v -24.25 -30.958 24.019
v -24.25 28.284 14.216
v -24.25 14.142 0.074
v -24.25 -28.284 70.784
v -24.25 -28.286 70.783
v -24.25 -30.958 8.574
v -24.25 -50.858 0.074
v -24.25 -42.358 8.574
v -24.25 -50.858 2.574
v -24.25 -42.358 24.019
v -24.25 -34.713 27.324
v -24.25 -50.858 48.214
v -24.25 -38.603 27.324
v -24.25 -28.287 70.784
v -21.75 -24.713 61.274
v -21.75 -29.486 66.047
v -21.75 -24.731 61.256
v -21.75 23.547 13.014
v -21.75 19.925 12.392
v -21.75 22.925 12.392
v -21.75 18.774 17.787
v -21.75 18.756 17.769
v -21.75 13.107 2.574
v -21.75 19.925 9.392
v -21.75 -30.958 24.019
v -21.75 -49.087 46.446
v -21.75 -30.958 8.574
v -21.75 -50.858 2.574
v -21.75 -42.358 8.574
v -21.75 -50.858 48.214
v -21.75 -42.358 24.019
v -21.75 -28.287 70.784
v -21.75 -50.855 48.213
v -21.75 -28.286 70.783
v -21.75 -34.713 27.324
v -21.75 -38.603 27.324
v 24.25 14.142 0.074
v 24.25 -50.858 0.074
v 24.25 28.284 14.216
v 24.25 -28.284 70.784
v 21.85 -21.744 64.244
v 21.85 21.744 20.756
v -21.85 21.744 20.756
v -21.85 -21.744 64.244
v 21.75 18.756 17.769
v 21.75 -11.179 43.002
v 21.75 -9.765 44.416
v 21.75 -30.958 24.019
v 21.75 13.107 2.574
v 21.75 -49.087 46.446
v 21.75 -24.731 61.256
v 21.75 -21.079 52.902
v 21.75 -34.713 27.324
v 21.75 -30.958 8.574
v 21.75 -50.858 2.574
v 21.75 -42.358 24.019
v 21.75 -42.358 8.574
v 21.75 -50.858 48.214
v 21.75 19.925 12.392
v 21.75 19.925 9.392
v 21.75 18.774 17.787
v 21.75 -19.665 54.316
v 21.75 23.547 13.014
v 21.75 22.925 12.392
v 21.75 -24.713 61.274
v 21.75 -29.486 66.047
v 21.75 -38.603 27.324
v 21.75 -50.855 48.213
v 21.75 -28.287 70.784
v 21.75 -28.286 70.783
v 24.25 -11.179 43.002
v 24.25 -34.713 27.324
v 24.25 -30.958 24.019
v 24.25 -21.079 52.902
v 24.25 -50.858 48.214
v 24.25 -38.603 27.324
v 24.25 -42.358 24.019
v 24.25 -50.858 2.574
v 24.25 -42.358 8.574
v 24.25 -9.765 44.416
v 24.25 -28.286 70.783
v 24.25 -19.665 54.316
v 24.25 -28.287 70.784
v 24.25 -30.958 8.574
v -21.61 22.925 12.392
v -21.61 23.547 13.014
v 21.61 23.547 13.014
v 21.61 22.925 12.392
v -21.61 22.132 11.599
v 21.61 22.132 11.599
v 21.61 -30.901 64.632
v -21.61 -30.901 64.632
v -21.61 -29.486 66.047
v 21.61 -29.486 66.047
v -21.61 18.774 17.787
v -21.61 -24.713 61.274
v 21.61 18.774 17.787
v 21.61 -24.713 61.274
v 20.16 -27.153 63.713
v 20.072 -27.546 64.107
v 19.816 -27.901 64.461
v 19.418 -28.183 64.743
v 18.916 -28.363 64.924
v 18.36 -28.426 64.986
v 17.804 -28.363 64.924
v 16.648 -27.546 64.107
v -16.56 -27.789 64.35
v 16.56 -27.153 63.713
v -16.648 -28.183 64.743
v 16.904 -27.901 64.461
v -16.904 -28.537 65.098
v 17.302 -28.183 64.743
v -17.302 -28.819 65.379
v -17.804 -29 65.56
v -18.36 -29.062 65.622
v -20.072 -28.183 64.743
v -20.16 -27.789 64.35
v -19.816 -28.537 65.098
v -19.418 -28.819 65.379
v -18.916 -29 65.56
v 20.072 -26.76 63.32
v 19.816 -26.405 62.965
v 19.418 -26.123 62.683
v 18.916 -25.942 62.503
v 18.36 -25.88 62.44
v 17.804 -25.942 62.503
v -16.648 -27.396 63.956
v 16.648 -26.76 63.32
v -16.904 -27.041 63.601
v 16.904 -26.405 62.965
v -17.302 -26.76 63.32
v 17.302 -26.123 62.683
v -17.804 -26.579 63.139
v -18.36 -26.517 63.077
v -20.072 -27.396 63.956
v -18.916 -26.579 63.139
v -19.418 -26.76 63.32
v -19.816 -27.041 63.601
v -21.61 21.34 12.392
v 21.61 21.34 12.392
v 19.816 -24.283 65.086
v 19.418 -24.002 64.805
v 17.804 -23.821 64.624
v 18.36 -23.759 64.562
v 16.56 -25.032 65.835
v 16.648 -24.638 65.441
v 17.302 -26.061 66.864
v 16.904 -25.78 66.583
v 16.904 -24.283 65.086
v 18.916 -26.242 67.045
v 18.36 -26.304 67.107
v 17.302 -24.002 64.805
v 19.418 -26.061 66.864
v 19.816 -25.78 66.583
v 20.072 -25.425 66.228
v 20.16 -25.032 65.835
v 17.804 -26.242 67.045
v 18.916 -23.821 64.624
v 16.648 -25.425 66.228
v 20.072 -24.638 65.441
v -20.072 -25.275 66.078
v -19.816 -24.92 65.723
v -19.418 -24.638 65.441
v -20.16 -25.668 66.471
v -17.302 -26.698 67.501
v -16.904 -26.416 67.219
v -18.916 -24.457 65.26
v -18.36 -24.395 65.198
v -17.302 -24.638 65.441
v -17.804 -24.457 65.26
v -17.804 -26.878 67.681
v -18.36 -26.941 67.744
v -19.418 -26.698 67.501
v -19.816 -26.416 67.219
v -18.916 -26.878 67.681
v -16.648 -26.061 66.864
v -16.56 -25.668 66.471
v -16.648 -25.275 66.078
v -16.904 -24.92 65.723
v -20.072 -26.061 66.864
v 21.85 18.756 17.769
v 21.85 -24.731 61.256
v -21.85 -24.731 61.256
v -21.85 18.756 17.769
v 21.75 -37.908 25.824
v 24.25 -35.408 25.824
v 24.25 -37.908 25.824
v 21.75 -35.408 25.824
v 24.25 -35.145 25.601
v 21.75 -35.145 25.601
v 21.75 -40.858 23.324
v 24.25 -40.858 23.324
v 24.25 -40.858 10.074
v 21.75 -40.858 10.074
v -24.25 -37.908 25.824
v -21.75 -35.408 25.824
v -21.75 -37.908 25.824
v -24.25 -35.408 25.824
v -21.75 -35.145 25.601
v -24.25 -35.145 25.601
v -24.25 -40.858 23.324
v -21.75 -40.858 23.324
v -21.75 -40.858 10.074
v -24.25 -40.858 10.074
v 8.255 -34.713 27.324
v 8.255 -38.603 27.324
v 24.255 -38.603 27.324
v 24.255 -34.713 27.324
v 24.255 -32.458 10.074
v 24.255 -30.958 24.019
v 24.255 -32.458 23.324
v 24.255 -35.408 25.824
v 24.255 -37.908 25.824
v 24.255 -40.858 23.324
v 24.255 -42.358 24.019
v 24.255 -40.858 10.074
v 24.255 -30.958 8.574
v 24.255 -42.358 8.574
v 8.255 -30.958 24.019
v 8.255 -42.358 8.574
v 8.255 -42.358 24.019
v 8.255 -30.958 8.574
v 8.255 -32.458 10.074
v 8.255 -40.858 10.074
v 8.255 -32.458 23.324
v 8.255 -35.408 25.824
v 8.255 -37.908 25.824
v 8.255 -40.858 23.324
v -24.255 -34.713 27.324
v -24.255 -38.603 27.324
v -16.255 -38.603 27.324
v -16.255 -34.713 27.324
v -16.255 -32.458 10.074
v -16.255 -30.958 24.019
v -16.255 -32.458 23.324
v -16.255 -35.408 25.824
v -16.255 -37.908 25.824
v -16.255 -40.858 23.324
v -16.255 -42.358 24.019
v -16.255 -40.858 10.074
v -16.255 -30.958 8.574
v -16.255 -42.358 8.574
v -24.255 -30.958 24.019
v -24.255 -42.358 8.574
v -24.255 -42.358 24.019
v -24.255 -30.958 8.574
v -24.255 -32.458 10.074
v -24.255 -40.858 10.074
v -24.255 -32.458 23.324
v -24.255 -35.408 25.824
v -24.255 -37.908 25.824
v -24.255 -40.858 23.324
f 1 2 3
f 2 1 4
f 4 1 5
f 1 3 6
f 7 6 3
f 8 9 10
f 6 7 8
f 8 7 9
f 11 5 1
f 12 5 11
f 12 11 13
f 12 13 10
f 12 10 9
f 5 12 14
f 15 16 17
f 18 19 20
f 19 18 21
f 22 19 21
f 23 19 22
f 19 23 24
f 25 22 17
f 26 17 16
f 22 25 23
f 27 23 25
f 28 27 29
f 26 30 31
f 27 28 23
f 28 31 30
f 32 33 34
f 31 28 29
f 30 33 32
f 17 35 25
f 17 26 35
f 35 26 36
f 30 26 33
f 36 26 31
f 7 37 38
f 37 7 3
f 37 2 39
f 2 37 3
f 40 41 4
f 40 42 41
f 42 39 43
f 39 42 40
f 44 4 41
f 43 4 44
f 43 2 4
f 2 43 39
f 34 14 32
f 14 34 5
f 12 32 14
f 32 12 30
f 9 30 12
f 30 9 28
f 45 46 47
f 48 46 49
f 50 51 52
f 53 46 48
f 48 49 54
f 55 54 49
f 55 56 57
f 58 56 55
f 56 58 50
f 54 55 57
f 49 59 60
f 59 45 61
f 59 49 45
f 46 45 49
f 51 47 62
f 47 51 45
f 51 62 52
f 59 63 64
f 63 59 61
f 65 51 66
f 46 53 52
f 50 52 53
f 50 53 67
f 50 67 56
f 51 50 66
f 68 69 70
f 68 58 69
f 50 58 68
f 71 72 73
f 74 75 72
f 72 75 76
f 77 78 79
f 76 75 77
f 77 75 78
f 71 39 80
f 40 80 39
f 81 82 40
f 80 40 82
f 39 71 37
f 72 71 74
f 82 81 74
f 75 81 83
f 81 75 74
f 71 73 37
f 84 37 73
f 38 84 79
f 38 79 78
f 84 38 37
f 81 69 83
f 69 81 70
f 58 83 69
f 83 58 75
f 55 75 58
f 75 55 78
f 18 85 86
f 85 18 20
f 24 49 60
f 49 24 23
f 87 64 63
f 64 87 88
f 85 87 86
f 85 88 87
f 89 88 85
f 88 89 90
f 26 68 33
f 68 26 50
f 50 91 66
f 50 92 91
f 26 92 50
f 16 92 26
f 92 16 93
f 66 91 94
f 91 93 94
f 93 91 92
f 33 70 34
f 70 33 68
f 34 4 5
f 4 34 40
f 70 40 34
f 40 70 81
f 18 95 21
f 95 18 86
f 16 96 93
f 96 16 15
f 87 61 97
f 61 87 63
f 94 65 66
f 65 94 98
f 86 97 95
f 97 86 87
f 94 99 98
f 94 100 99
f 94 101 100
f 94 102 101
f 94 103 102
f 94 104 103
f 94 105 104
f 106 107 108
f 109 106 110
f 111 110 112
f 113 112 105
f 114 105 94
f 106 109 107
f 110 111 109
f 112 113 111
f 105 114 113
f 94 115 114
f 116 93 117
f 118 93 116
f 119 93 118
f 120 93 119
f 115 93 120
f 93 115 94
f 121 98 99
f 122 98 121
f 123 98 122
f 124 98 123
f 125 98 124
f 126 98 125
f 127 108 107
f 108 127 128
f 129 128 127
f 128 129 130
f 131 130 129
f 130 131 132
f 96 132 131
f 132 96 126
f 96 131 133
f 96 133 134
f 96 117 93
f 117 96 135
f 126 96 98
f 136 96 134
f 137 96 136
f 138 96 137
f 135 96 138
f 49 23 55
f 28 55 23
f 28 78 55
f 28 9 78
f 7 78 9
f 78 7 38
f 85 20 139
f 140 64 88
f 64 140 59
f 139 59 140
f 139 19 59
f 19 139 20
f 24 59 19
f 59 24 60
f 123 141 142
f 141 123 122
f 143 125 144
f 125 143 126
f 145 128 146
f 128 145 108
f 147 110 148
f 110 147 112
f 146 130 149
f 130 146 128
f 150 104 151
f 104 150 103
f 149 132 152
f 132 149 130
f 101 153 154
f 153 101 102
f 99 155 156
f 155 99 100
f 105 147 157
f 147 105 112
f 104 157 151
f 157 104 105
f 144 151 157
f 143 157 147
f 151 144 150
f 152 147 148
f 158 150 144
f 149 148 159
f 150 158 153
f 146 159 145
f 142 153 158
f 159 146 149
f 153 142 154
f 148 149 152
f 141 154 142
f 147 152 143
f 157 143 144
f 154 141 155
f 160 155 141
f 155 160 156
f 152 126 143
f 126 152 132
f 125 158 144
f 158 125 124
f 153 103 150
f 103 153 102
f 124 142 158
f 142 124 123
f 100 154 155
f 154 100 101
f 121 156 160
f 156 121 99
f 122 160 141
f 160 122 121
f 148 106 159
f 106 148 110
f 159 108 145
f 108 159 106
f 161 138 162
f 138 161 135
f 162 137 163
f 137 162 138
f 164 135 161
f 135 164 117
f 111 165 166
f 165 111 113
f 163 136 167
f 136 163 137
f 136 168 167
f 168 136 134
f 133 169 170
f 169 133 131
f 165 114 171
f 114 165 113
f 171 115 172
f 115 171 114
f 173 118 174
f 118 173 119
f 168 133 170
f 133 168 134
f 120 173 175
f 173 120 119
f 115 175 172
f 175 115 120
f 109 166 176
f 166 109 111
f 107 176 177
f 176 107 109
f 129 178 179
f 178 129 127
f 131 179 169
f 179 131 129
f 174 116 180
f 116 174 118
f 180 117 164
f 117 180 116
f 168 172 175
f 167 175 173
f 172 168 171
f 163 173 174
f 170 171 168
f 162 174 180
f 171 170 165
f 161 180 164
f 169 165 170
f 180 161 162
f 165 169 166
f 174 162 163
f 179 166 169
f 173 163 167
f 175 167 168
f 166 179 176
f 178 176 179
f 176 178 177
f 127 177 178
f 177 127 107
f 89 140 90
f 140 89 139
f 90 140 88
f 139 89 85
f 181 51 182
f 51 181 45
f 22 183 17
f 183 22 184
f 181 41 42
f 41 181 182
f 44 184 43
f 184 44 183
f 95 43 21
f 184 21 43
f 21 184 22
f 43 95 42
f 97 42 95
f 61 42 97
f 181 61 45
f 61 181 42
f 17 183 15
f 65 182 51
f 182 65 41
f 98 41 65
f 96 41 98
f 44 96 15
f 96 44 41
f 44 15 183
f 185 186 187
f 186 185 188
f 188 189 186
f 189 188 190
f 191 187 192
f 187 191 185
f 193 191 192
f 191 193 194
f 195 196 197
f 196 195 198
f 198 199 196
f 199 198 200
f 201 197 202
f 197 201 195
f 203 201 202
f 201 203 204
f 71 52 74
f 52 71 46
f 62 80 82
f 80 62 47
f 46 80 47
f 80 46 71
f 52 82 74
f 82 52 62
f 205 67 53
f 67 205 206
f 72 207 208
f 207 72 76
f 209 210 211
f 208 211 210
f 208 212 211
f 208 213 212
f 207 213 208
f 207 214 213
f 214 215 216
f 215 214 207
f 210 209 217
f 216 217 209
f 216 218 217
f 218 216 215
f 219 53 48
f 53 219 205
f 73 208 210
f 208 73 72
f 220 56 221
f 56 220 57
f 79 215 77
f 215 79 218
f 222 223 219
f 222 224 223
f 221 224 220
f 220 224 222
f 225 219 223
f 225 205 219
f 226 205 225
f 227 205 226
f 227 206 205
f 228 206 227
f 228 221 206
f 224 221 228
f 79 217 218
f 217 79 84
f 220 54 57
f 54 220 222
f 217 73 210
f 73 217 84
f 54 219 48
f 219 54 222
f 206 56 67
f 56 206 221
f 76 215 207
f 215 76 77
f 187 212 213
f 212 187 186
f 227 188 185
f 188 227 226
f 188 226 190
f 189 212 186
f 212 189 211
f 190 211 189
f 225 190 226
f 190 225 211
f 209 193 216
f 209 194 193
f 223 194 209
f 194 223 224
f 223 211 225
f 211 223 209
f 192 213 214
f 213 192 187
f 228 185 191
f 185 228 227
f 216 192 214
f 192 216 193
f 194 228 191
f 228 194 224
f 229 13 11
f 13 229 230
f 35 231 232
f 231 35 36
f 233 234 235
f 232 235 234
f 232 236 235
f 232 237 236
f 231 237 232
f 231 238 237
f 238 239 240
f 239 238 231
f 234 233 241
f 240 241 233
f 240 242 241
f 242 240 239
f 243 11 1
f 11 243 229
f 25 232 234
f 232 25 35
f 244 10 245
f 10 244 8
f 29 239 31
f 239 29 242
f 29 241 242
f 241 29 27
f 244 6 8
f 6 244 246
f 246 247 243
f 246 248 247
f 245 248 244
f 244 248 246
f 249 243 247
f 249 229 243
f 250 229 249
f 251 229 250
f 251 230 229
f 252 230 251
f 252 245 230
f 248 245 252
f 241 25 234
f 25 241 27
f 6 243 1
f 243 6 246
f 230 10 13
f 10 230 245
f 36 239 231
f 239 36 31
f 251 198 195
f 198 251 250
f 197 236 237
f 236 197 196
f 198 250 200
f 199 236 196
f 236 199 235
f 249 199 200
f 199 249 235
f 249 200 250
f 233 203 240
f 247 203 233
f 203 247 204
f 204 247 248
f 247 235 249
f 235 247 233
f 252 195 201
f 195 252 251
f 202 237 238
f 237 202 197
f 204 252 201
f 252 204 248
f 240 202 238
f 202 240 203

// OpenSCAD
// Screen Model
model = "basic"; //[basic:Basic, enhanced:Enhanced]

// SD Card cut-out
sdcard = "y"; //[y:Yes, n:No]

// XT Connectors
connector = "both"; //[none: None, left:Left Only, right:Right Only, both: Both Sides]

// Direction
direction = "stand"; //[print: Printable, stand: Standing]

module inner_plug(h=0.51) {
    linear_extrude(height=h,center=true)
    polygon(
    [
        [0,0],
        [8.4,0],
        [8.4,13.25],
        [8.4-(8.4-2.5)/2,13.25+2.5],
        [(8.4-2.5)/2,13.25+2.5],
        [0,13.25],
    ])
    ;
}

module outer_plug(h=0.5) {
linear_extrude(height=h,center=true)
    translate([4.2,0])
    polygon(
    [
        [-5.7,	-1.5],
        [-5.7,	13.945],
        [-1.945,	17.25],
        [1.945,	17.25],
        [5.7,	13.945],
        [5.7,	-1.5],
    ]
   );
}

module plug(h=0.5) {
    translate([65.9619407771256,-5.96194077712558,0])
    rotate([0,0,-45+180])
    translate([10,10])
    difference(){    
        outer_plug(h);
        inner_plug(h+0.1);
    }
}

module plug_cut(h=0.5) {
    translate([65.9619407771256,-5.96194077712558,0])
    rotate([0,0,-45+180])
    translate([10,10])
    inner_plug(h+0.1);
}

module sidepanel() {   
    //rotate([0,90,0])
    linear_extrude(height=2.5,center=true)
    polygon(
    [
        [0,0],
        [0,40],
        [20,40],
        [65.9619407771256,-5.96194077712558],
        [31.9218203308052,-40.002061223446],
        [0.00182033080519517,-40.002061223446],
        [0.00182033080518537,-0.00206122344599891],
    ]);
}

module sd_cut() {
    translate([5.8+0.75,-74.4/2+13.94+8,24])
    cube([2,14,5],center=true);
}
    
module bolt_cut() {
    
    $fn=20;
    translate([5.8-1.6-3/2,-74.4/2+2.1+1.8/2,36.72/2])
    rotate([0,90,0])
    cylinder(r=1.8,h=3,center=true);
    
    translate([5.8-1.6-3/2,-74.4/2+2.1,-36.72/2])
    rotate([0,90,0])
    cylinder(r=1.8,h=3,center=true);
}


module hasp() {
    difference() {
    union() {
        color("lightgray")
    translate([0,0,-23]) sidepanel();
        color("darkgray")
    translate([0,0,23-0*2.50]) sidepanel();

    //bottom slope
    translate([10,40-1.25,0]) cube([20,2.5,23*2+2.5],center=true);
    //top slope
    translate([31.92/2,-40+1.25,0]) cube([31.92,2.5,23*2+2.5],center=true);

    // front
    translate([4.2/2,0,0]) cube([4.2,80,23*2+2.5],center=true);
 
    // floor
    
    
    translate([20,40,-23-2.5/2]) rotate([0,0,45+180]) cube([2.5,65,23*2+2.5],center=false);
        
        
        
    //bottom lip large
    /*translate([7.2,40-2.5,24-17/2])
    rotate([0,0,45])
    cube([3,3,17+2.5],center=true);*/

    //bottom lip small
    translate([7.2,40-2.5,0])
    rotate([0,0,45])
    cube([3,3,22.5*2+2.5],center=true);
    }

    //pcb cutout
    translate([4.2+1,0,0]) cube([2,75,42.72+0.5],center=true);

    //translate([9.2,-35,0]) cube([10,10,20],center=true);

    //screen cutout
    translate([4.2/2,0,0]) color("black") cube([4.25,61.5,43.7],center=true);


    if (connector == "both" || connector == "left") 
    color("cyan") translate([0,0,23+1.25-16/2+0.005]) plug_cut(20);

    if (connector == "both" || connector == "right") 
    color("orange")translate([0,0,-23-1.25+8/2-0.005]) plug_cut(20);
    
    
    if (sdcard == "y") sd_cut();

    bolt_cut();
    }

    if (connector == "both" || connector == "left") 
    color("cyan") translate([0,0,23+1.25-16/2+0.005]) plug(16);

    if (connector == "both" || connector == "right") 
    color("orange")translate([0,0,-23-1.25+8/2-0.005]) plug(8);


/*
    // plug supports
    hull() {
    translate([35.2,-13.75,9.25],center=true)
    cube([1,4.5,1.5]);

    translate([35.2,-13.75,23],center=true)
    cube([1,4.5,1.5]);

    translate([35-10
    ,-13.5+10,23],center=true)
    cube([0.1,0.1,0.1]);
    };

    hull() {
    translate([35.2,-13.75,-18.75],center=true)
    cube([1,4.5,1.5]);

    translate([35.2,-13.75,-23],center=true)
    cube([1,4.5,1.5]);

    translate([35-8,-13.5+10,-23],center=true)
    cube([0.1,0.1,0.1]);
    };*/
}

if (direction == "print") {
    rotate([0,-90,0]) hasp();
} else {
    translate([0,0,40+2.5])
    rotate([0,90,0]) rotate([0,0,-45]) hasp();
}
